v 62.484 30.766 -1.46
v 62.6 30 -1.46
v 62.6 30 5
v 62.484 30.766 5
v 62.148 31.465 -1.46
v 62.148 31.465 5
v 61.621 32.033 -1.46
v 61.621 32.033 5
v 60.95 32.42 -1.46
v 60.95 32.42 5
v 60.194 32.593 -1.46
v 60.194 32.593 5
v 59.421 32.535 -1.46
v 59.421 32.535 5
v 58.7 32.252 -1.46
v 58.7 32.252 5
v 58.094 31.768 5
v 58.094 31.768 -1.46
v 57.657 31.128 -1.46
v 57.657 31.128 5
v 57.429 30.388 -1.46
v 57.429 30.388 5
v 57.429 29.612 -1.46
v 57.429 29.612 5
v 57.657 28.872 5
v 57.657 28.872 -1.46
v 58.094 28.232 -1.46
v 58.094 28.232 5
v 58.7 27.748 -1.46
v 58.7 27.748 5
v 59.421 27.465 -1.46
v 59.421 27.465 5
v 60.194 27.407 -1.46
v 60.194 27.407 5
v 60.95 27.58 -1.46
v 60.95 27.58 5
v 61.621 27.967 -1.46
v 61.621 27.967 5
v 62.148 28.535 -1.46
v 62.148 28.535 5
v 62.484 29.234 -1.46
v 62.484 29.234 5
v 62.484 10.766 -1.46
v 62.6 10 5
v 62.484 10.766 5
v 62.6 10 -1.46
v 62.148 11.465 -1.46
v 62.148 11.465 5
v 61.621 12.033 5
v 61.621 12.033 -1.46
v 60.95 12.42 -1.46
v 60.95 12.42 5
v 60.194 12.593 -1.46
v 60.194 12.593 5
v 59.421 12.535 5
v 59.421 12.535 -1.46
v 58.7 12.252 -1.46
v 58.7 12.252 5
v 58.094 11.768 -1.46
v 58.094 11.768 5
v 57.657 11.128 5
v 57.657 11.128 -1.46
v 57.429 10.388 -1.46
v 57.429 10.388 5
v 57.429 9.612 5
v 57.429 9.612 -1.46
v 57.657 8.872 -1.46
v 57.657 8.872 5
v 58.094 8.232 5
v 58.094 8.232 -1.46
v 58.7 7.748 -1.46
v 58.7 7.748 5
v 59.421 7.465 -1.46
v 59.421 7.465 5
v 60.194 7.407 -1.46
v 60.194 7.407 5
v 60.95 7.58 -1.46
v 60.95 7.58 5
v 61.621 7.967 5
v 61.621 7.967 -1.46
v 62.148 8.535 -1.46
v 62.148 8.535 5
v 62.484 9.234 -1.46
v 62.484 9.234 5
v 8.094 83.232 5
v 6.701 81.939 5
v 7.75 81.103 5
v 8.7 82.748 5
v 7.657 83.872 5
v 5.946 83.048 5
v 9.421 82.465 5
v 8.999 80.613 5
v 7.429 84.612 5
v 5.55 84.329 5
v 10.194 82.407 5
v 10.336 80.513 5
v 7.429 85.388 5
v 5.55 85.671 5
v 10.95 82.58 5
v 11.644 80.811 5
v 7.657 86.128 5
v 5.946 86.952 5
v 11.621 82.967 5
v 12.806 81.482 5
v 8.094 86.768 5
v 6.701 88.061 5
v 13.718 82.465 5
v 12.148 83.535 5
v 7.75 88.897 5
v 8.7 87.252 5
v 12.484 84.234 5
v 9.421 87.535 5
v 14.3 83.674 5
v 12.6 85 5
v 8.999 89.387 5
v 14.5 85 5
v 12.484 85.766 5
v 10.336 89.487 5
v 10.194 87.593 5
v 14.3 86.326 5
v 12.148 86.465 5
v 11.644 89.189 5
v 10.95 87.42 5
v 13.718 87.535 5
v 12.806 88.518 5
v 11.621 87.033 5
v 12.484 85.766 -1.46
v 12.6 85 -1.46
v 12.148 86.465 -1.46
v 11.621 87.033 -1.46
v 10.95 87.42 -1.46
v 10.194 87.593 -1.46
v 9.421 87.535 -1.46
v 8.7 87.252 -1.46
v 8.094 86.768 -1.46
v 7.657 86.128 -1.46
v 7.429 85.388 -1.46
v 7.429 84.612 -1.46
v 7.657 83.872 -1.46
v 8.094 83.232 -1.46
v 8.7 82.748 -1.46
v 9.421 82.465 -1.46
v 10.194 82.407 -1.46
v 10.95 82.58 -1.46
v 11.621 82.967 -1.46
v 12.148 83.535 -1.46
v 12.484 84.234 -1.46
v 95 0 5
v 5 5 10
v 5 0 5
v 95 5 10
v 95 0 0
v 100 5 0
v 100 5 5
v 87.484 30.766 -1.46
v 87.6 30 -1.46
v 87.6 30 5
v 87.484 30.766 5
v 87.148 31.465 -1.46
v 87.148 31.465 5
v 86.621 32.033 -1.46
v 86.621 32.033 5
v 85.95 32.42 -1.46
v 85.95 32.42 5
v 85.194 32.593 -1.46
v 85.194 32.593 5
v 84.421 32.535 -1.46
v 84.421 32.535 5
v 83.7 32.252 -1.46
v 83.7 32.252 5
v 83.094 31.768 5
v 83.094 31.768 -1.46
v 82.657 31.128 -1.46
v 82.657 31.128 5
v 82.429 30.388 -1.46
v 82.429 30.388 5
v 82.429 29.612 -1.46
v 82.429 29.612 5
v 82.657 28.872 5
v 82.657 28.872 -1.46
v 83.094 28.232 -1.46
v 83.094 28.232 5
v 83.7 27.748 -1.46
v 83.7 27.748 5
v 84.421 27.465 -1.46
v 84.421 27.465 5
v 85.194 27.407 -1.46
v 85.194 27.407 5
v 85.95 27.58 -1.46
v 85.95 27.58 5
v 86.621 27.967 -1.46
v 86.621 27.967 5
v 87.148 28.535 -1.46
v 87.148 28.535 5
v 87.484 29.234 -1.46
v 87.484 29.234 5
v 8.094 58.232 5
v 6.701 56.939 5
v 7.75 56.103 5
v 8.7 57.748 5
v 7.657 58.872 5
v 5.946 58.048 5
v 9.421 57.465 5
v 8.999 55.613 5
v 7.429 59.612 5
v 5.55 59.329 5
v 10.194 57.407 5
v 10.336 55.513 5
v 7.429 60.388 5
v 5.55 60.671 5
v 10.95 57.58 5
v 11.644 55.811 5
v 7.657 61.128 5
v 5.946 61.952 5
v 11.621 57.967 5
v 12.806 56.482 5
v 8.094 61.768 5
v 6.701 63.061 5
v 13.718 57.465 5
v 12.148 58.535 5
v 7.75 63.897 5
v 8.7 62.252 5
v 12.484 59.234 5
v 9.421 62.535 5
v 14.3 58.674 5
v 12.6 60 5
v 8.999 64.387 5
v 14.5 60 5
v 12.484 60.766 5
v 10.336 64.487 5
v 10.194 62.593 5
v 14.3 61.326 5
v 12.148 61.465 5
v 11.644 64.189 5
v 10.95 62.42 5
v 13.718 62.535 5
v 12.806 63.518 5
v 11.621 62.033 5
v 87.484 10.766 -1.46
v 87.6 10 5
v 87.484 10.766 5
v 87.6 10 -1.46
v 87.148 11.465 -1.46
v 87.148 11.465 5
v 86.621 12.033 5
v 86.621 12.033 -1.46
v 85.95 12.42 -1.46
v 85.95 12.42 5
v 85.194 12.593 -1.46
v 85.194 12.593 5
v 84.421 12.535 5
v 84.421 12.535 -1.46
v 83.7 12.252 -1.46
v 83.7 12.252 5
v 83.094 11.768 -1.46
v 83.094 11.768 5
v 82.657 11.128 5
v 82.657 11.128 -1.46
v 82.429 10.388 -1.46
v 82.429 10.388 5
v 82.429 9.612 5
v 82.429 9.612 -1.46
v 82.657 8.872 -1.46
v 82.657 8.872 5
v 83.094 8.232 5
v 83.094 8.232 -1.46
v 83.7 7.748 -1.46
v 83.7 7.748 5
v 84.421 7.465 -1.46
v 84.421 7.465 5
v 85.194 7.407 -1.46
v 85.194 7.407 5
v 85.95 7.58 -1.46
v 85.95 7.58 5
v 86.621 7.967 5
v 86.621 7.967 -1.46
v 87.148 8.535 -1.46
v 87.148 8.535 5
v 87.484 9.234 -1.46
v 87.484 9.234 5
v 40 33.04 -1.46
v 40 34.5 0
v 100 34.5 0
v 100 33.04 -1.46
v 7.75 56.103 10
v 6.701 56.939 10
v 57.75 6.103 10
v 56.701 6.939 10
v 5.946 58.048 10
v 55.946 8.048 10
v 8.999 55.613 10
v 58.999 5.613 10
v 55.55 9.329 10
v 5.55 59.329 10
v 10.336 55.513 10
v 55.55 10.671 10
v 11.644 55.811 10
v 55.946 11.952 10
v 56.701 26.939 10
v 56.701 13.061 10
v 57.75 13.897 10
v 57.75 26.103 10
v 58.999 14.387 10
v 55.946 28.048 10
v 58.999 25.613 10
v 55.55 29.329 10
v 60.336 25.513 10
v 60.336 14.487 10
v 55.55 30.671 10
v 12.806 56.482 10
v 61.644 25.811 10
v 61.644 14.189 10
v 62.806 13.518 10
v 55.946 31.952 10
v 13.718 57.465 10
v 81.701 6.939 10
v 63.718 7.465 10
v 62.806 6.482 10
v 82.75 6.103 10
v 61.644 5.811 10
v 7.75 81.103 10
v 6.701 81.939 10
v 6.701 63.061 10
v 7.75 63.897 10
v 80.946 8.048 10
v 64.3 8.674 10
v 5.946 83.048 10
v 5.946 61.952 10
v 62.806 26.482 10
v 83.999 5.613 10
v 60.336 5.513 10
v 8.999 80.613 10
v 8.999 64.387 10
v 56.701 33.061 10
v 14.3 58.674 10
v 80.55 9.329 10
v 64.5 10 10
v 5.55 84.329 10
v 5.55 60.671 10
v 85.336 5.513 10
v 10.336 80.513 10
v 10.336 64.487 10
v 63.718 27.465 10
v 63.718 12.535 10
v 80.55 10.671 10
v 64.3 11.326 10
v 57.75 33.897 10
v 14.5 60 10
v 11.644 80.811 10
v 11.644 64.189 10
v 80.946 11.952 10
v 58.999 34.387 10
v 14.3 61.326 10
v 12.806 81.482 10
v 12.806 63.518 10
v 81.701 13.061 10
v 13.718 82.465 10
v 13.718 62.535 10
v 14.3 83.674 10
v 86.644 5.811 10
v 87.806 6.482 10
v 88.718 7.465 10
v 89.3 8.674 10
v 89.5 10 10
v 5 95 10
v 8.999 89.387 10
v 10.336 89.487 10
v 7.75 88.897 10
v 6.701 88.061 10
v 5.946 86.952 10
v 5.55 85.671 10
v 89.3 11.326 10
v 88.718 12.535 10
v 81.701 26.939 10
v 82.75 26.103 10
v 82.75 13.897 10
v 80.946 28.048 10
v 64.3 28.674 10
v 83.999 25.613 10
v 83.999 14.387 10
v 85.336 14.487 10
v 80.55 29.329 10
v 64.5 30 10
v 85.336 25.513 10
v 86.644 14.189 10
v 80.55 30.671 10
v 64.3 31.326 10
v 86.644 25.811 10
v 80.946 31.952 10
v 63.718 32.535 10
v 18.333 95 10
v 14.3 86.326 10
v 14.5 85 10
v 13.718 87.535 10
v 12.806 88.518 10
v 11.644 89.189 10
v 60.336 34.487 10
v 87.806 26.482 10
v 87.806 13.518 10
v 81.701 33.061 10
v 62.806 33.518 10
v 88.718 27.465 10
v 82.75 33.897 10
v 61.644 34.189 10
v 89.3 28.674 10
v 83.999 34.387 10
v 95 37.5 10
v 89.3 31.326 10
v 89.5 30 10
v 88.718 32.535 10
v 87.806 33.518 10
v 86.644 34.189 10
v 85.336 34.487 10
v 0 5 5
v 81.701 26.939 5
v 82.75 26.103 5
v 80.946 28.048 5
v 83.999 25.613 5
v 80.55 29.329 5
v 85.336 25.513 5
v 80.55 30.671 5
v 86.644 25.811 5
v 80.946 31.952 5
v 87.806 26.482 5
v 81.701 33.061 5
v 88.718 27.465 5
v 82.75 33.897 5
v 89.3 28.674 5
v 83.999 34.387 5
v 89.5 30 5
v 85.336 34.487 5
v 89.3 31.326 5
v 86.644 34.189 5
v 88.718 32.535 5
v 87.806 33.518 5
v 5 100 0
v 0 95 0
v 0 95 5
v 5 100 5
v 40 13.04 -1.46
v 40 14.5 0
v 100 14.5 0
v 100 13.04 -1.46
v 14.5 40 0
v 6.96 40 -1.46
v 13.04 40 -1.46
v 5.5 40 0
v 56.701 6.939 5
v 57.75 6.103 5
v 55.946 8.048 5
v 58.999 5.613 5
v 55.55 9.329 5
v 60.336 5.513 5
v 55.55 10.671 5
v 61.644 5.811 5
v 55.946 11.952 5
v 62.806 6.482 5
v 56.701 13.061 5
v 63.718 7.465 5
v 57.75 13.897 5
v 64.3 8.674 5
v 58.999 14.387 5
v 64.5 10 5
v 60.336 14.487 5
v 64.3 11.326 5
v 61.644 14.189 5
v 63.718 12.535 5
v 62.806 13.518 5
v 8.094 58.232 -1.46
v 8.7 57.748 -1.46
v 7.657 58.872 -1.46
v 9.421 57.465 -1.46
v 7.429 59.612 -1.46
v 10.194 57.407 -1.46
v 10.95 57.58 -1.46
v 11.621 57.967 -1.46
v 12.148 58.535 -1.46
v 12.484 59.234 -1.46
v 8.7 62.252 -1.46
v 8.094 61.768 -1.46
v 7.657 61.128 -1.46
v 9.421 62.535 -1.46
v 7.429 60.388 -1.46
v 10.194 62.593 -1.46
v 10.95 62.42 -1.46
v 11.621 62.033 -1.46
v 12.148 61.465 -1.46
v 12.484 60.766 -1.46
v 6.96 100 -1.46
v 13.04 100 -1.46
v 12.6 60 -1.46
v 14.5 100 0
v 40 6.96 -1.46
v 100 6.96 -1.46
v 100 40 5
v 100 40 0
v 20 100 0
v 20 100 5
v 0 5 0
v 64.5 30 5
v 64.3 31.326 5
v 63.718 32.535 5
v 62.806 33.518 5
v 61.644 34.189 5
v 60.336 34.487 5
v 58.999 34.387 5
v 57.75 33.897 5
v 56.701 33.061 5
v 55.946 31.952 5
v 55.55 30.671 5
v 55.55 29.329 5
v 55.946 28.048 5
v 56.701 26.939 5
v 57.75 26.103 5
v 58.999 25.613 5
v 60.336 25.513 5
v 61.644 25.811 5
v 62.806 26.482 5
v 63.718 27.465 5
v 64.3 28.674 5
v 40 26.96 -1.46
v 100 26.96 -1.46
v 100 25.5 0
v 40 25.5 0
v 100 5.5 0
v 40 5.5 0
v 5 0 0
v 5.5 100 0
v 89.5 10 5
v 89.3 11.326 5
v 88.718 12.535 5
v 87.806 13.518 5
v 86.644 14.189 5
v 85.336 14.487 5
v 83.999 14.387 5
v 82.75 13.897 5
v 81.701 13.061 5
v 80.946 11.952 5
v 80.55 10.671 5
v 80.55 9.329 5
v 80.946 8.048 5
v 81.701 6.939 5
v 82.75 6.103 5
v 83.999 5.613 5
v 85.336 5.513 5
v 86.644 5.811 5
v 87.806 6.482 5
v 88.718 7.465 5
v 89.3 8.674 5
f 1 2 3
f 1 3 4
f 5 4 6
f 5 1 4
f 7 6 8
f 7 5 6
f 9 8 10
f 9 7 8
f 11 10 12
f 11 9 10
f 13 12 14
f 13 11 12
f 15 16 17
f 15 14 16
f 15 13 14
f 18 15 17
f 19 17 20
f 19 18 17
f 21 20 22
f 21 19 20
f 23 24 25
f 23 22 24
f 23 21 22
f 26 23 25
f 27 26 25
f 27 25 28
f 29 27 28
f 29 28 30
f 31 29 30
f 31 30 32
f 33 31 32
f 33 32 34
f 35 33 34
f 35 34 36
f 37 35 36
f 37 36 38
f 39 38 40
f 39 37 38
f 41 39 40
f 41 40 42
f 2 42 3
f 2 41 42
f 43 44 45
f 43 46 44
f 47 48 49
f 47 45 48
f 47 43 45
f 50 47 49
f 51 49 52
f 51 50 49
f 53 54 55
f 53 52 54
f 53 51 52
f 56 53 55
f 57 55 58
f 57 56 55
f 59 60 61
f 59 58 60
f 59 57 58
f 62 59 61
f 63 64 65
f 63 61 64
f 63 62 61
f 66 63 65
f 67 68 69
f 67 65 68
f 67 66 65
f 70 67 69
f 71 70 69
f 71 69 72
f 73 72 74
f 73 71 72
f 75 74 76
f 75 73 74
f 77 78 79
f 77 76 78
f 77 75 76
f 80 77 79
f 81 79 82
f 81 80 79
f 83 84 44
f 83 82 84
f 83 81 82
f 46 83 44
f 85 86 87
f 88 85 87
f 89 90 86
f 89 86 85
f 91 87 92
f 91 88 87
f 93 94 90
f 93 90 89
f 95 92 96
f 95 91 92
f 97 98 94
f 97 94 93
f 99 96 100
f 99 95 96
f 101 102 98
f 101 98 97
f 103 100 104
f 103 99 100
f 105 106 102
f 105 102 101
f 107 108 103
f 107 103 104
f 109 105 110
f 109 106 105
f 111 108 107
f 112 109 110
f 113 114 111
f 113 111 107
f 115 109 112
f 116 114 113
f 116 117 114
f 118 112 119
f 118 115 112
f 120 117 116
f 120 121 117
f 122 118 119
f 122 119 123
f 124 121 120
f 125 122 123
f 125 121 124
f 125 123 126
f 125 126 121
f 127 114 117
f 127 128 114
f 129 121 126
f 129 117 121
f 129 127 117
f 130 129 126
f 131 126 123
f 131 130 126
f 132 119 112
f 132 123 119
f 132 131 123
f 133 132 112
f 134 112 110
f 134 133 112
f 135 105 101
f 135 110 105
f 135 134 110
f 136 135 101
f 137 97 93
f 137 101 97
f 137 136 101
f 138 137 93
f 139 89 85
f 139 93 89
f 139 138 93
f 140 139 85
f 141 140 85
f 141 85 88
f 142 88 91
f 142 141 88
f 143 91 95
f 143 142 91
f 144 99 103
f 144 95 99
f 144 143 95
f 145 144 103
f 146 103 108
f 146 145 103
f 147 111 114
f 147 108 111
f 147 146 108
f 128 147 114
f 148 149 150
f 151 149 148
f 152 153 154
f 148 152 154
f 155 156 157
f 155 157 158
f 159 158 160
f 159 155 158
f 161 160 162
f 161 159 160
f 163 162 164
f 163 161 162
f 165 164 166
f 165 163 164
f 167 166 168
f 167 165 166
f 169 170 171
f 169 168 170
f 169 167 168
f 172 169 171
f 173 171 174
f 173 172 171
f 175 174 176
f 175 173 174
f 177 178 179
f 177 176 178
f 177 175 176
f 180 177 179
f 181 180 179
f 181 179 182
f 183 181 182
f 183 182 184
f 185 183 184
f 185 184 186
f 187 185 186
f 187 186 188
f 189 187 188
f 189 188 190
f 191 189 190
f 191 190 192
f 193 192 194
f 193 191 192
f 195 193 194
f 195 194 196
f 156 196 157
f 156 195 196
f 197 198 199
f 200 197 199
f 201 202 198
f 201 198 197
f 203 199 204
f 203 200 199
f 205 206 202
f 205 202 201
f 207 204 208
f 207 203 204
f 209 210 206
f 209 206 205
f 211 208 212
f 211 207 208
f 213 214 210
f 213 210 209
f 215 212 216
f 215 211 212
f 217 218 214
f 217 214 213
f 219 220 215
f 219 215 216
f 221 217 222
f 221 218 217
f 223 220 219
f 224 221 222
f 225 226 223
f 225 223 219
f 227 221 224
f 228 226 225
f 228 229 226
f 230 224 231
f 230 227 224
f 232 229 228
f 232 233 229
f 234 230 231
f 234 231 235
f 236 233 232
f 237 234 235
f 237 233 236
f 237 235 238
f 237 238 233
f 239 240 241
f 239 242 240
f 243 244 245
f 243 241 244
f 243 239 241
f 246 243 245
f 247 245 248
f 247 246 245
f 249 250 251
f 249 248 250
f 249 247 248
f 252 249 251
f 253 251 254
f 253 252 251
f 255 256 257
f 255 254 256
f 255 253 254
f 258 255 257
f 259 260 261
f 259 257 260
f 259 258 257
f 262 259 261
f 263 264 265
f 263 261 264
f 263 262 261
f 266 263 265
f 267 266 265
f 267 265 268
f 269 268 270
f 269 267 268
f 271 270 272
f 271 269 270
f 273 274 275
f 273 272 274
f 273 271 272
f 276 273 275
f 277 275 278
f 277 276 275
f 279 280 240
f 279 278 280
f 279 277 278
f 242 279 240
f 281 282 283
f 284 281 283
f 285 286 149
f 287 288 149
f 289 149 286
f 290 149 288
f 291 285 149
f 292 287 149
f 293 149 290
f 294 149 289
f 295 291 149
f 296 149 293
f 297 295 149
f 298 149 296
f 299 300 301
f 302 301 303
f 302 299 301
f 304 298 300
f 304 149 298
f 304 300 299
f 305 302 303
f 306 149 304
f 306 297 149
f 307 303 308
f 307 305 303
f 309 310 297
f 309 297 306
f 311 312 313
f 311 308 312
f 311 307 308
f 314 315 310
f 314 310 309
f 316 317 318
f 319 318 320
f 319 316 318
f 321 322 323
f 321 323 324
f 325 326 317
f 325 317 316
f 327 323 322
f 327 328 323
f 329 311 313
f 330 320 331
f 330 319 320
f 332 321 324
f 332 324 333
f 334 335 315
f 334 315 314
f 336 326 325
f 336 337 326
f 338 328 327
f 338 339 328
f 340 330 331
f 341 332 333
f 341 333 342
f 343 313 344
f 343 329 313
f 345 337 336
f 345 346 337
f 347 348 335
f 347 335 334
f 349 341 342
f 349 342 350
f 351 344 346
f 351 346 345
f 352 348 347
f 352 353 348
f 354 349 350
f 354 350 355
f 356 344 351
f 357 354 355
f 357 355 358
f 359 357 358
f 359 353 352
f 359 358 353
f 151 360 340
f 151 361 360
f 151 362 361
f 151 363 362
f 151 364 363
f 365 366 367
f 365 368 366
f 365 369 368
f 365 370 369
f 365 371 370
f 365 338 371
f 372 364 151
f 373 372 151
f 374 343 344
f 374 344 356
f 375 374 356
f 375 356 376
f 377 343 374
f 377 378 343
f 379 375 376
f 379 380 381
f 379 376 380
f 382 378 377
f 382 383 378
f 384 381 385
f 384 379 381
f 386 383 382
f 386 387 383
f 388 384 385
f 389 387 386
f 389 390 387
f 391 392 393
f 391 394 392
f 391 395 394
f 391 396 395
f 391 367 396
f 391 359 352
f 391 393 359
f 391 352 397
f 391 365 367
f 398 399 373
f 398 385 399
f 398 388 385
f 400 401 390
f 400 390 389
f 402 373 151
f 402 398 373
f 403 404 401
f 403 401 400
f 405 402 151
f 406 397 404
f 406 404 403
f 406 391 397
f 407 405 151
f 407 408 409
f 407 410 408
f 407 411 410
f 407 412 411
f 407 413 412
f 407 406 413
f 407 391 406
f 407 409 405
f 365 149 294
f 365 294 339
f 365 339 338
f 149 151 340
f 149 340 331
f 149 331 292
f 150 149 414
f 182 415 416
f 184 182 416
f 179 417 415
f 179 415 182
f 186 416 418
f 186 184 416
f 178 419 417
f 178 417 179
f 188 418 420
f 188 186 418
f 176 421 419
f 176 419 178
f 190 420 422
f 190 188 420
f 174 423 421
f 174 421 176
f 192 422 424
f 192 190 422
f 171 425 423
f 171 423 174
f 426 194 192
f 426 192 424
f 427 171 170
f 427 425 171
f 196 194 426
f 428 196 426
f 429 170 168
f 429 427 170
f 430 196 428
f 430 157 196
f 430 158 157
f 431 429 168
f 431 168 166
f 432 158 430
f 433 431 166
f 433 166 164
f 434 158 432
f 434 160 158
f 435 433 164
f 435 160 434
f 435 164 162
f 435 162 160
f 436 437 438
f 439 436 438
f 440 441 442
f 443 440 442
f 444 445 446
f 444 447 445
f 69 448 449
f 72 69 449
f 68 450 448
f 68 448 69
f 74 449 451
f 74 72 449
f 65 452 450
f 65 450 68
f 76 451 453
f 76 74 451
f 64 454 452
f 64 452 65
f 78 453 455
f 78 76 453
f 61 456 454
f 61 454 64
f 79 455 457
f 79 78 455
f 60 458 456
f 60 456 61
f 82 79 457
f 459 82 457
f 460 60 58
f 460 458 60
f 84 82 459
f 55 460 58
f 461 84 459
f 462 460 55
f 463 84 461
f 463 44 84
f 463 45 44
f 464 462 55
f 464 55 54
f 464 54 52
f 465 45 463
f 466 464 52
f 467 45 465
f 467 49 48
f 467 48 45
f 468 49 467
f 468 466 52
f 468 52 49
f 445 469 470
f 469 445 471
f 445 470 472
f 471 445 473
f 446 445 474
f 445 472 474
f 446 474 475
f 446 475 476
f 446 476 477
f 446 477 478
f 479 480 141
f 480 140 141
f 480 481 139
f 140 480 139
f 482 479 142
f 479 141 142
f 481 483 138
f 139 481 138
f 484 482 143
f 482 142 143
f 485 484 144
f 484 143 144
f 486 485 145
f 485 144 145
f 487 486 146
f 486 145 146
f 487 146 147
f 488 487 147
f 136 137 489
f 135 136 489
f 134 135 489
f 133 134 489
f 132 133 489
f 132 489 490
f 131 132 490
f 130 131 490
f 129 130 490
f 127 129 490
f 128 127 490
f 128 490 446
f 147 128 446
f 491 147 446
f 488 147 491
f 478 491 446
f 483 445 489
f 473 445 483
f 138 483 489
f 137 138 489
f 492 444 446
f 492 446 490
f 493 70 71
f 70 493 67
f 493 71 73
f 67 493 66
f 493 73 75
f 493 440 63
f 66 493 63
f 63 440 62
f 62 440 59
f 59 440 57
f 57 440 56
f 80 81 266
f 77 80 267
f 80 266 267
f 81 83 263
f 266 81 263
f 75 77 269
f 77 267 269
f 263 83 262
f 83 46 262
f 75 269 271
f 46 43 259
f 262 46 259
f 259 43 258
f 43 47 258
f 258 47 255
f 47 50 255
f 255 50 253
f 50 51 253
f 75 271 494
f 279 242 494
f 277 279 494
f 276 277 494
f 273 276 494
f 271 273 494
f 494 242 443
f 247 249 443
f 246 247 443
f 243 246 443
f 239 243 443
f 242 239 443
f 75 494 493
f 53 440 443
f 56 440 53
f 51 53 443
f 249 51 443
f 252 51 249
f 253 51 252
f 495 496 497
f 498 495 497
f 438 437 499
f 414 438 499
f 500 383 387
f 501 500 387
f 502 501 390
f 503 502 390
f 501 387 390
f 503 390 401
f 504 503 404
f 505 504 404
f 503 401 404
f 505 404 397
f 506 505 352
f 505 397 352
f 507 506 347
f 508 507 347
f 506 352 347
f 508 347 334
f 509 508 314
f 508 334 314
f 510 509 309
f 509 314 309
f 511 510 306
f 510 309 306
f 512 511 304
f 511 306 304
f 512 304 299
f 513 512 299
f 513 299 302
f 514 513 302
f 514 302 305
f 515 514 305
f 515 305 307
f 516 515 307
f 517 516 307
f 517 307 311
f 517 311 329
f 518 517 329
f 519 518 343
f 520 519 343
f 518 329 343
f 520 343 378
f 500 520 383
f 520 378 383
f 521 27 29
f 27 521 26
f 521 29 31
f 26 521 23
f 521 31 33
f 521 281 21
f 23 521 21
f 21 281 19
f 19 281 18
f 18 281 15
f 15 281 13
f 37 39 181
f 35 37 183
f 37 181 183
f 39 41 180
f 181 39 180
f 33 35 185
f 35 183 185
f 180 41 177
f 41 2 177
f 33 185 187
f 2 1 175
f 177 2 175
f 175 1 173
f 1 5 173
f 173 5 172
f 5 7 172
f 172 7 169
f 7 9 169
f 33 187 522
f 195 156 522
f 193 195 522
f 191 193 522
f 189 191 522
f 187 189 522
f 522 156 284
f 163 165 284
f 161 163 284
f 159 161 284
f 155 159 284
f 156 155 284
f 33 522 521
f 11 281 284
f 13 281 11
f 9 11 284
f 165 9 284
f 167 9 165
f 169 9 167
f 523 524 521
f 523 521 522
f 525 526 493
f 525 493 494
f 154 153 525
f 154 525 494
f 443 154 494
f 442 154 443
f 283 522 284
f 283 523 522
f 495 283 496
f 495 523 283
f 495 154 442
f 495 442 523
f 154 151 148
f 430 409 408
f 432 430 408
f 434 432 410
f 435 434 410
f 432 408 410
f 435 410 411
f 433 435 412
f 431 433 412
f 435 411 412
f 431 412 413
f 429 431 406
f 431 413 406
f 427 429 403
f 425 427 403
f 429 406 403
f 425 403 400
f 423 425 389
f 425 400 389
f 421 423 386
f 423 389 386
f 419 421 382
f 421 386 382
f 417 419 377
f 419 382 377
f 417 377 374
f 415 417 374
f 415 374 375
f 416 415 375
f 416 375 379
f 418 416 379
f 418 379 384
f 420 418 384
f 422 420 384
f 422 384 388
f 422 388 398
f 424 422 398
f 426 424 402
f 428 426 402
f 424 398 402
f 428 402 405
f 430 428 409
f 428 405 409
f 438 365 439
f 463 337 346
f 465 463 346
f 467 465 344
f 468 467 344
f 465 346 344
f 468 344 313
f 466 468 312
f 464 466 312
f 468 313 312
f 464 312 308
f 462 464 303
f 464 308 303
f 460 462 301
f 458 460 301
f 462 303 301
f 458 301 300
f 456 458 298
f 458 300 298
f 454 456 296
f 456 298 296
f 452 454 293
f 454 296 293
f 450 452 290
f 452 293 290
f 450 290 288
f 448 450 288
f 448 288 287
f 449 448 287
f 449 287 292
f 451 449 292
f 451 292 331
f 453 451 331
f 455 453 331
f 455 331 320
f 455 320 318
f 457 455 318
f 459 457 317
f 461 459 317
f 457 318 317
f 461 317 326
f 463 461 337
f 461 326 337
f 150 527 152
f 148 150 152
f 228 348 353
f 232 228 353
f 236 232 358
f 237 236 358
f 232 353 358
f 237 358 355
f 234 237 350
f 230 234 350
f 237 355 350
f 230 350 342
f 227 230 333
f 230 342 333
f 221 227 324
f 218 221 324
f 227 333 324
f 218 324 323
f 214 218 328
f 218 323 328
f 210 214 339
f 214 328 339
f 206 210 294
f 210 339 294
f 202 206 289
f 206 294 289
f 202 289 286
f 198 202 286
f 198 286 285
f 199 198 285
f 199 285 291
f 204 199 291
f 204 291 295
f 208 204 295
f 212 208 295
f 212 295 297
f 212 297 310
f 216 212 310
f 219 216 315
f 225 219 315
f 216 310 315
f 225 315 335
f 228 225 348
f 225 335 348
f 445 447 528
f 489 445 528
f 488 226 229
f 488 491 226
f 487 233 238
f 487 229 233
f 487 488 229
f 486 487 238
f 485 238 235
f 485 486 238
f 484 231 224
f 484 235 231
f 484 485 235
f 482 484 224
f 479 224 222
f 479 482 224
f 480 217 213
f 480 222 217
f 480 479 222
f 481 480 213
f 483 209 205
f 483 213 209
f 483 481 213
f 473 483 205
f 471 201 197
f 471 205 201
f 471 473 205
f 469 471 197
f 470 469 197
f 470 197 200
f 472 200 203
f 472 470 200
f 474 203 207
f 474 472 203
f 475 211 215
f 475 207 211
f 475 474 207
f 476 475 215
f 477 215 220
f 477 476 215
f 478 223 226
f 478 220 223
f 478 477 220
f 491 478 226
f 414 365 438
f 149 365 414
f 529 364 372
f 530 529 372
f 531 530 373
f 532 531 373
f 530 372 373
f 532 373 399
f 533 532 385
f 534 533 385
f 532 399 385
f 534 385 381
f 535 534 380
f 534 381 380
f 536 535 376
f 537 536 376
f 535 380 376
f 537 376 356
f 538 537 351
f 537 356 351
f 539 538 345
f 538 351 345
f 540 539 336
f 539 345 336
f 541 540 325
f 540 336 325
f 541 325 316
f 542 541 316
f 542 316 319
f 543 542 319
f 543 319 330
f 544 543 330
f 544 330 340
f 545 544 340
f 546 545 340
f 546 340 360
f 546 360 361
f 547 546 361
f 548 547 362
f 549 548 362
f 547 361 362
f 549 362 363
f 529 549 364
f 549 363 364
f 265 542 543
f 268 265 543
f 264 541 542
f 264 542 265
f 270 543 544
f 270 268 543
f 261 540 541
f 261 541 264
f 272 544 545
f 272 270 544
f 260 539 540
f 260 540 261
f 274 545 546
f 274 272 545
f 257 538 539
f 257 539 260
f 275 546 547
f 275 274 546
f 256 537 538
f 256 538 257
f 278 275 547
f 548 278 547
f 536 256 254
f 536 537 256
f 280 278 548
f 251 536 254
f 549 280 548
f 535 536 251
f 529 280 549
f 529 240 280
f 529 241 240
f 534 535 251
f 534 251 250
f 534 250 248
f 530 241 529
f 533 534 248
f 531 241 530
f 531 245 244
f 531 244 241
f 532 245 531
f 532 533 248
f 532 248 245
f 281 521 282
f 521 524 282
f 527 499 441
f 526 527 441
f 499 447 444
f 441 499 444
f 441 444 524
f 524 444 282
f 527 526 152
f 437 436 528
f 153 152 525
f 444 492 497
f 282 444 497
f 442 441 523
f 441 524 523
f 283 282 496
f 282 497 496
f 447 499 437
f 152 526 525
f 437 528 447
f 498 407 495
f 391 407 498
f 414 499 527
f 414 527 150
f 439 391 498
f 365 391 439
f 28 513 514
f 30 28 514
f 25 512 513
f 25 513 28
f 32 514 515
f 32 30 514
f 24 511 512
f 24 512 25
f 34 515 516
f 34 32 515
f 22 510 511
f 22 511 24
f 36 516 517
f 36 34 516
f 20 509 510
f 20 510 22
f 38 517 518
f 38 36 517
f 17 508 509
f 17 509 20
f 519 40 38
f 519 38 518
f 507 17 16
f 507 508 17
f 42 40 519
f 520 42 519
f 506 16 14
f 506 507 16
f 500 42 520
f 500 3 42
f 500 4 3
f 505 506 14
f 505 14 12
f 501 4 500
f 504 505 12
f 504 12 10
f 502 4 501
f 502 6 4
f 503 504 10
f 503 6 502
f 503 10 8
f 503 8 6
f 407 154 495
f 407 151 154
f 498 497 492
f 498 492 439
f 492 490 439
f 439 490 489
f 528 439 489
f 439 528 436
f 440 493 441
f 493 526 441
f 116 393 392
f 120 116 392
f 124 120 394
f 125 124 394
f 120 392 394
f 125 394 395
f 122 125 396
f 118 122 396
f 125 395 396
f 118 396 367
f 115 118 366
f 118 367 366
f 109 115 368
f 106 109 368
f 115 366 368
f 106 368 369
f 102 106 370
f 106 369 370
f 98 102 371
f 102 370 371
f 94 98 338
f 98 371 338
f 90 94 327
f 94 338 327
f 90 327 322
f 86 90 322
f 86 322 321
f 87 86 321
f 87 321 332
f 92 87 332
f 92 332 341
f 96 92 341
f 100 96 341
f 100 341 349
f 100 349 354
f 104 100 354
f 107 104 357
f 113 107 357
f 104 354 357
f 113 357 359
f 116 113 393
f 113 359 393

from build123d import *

# Parameters (mm, degrees)
BOSS_EXTRUDE1_DEPTH     = 10
SKETCH2_R               = 2.6
CUT_EXTRUDE1_DEPTH      = 142.774468788
SKETCH3_W               = 60
SKETCH3_H               = 9
SKETCH3_W_2             = 9
SKETCH3_H_2             = 60
BOSS_EXTRUDE3_DEPTH     = 1.46
CUT_EXTRUDE2_DEPTH      = 142.774468788
CUT_EXTRUDE2_DEPTH_BACK = 142.774468788
SKETCH2_2_R             = 2.6
CHAMFER1_SIZE           = 1.46
CUT_EXTRUDE3_START      = 10
SKETCH4_R               = 4.5
CUT_EXTRUDE3_DEPTH      = 5
CHAMFER2_SIZE           = 5


with BuildPart() as part:
    # Sketch1 → Boss-Extrude1 (new body)
    with BuildSketch(Plane.XY):
        Polygon((0, 0), (100, 0), (100, 40), (20, 100), (0, 100), align=None)
    extrude(amount=BOSS_EXTRUDE1_DEPTH)

    # Sketch2 → Cut-Extrude1 (cut, through all)
    with BuildSketch(Plane.XY):
        with Locations((10, 85)):
            Circle(SKETCH2_R)
        with Locations((10, 60)):
            Circle(SKETCH2_R)
        with Locations((85, 30)):
            Circle(SKETCH2_R)
        with Locations((85, 10)):
            Circle(SKETCH2_R)
        with Locations((60, 10)):
            Circle(SKETCH2_R)
        with Locations((60, 30)):
            Circle(SKETCH2_R)
    extrude(amount=CUT_EXTRUDE1_DEPTH, mode=Mode.SUBTRACT)

    # Sketch3 → Boss-Extrude3 (add)
    with BuildSketch(Plane.XY):
        with Locations((70, 30)):
            Rectangle(SKETCH3_W, SKETCH3_H)
        with Locations((70, 10)):
            Rectangle(SKETCH3_W, SKETCH3_H)
        with Locations((10, 70)):
            Rectangle(SKETCH3_W_2, SKETCH3_H_2)
    extrude(amount=-BOSS_EXTRUDE3_DEPTH)

    # Sketch2<2> → Cut-Extrude2 (cut, two sides: drawn at the far end of the back side and taken through both)
    with BuildSketch(Plane.XY.offset(-CUT_EXTRUDE2_DEPTH_BACK)):
        with Locations((10, 85)):
            Circle(SKETCH2_2_R)
        with Locations((10, 60)):
            Circle(SKETCH2_2_R)
        with Locations((85, 30)):
            Circle(SKETCH2_2_R)
        with Locations((85, 10)):
            Circle(SKETCH2_2_R)
        with Locations((60, 10)):
            Circle(SKETCH2_2_R)
        with Locations((60, 30)):
            Circle(SKETCH2_2_R)
    extrude(amount=CUT_EXTRUDE2_DEPTH + CUT_EXTRUDE2_DEPTH_BACK, mode=Mode.SUBTRACT)

    # Chamfer1
    chamfer1_edges = [part.edges().sort_by_distance(p)[0] for p in [
        (14.5, 70, -1.46),
        (5.5, 70, -1.46),
        (70, 5.5, -1.46),
        (70, 14.5, -1.46),
        (70, 25.5, -1.46),
        (70, 34.5, -1.46),
    ]]
    chamfer(chamfer1_edges, length=CHAMFER1_SIZE - 0.0001)  # a hair under: the kernel refuses the full size

    # Sketch4 → Cut-Extrude3 (cut)
    with BuildSketch(Plane.XY.offset(CUT_EXTRUDE3_START)):
        with Locations((10, 85)):
            Circle(SKETCH4_R)
        with Locations((10, 60)):
            Circle(SKETCH4_R)
        with Locations((60, 30)):
            Circle(SKETCH4_R)
        with Locations((85, 30)):
            Circle(SKETCH4_R)
        with Locations((85, 10)):
            Circle(SKETCH4_R)
        with Locations((60, 10)):
            Circle(SKETCH4_R)
    extrude(amount=-CUT_EXTRUDE3_DEPTH, mode=Mode.SUBTRACT)

    # Chamfer2
    chamfer2_edges = [part.edges().sort_by_distance(p)[0] for p in [
        (100, 20, 10),
        (60, 70, 10),
        (10, 100, 10),
        (0, 50, 10),
        (50, 0, 10),
        (0, 100, 5),
        (100, 0, 5),
        (0, 0, 5),
    ]]
    chamfer(chamfer2_edges, length=CHAMFER2_SIZE)


solid = part.part
